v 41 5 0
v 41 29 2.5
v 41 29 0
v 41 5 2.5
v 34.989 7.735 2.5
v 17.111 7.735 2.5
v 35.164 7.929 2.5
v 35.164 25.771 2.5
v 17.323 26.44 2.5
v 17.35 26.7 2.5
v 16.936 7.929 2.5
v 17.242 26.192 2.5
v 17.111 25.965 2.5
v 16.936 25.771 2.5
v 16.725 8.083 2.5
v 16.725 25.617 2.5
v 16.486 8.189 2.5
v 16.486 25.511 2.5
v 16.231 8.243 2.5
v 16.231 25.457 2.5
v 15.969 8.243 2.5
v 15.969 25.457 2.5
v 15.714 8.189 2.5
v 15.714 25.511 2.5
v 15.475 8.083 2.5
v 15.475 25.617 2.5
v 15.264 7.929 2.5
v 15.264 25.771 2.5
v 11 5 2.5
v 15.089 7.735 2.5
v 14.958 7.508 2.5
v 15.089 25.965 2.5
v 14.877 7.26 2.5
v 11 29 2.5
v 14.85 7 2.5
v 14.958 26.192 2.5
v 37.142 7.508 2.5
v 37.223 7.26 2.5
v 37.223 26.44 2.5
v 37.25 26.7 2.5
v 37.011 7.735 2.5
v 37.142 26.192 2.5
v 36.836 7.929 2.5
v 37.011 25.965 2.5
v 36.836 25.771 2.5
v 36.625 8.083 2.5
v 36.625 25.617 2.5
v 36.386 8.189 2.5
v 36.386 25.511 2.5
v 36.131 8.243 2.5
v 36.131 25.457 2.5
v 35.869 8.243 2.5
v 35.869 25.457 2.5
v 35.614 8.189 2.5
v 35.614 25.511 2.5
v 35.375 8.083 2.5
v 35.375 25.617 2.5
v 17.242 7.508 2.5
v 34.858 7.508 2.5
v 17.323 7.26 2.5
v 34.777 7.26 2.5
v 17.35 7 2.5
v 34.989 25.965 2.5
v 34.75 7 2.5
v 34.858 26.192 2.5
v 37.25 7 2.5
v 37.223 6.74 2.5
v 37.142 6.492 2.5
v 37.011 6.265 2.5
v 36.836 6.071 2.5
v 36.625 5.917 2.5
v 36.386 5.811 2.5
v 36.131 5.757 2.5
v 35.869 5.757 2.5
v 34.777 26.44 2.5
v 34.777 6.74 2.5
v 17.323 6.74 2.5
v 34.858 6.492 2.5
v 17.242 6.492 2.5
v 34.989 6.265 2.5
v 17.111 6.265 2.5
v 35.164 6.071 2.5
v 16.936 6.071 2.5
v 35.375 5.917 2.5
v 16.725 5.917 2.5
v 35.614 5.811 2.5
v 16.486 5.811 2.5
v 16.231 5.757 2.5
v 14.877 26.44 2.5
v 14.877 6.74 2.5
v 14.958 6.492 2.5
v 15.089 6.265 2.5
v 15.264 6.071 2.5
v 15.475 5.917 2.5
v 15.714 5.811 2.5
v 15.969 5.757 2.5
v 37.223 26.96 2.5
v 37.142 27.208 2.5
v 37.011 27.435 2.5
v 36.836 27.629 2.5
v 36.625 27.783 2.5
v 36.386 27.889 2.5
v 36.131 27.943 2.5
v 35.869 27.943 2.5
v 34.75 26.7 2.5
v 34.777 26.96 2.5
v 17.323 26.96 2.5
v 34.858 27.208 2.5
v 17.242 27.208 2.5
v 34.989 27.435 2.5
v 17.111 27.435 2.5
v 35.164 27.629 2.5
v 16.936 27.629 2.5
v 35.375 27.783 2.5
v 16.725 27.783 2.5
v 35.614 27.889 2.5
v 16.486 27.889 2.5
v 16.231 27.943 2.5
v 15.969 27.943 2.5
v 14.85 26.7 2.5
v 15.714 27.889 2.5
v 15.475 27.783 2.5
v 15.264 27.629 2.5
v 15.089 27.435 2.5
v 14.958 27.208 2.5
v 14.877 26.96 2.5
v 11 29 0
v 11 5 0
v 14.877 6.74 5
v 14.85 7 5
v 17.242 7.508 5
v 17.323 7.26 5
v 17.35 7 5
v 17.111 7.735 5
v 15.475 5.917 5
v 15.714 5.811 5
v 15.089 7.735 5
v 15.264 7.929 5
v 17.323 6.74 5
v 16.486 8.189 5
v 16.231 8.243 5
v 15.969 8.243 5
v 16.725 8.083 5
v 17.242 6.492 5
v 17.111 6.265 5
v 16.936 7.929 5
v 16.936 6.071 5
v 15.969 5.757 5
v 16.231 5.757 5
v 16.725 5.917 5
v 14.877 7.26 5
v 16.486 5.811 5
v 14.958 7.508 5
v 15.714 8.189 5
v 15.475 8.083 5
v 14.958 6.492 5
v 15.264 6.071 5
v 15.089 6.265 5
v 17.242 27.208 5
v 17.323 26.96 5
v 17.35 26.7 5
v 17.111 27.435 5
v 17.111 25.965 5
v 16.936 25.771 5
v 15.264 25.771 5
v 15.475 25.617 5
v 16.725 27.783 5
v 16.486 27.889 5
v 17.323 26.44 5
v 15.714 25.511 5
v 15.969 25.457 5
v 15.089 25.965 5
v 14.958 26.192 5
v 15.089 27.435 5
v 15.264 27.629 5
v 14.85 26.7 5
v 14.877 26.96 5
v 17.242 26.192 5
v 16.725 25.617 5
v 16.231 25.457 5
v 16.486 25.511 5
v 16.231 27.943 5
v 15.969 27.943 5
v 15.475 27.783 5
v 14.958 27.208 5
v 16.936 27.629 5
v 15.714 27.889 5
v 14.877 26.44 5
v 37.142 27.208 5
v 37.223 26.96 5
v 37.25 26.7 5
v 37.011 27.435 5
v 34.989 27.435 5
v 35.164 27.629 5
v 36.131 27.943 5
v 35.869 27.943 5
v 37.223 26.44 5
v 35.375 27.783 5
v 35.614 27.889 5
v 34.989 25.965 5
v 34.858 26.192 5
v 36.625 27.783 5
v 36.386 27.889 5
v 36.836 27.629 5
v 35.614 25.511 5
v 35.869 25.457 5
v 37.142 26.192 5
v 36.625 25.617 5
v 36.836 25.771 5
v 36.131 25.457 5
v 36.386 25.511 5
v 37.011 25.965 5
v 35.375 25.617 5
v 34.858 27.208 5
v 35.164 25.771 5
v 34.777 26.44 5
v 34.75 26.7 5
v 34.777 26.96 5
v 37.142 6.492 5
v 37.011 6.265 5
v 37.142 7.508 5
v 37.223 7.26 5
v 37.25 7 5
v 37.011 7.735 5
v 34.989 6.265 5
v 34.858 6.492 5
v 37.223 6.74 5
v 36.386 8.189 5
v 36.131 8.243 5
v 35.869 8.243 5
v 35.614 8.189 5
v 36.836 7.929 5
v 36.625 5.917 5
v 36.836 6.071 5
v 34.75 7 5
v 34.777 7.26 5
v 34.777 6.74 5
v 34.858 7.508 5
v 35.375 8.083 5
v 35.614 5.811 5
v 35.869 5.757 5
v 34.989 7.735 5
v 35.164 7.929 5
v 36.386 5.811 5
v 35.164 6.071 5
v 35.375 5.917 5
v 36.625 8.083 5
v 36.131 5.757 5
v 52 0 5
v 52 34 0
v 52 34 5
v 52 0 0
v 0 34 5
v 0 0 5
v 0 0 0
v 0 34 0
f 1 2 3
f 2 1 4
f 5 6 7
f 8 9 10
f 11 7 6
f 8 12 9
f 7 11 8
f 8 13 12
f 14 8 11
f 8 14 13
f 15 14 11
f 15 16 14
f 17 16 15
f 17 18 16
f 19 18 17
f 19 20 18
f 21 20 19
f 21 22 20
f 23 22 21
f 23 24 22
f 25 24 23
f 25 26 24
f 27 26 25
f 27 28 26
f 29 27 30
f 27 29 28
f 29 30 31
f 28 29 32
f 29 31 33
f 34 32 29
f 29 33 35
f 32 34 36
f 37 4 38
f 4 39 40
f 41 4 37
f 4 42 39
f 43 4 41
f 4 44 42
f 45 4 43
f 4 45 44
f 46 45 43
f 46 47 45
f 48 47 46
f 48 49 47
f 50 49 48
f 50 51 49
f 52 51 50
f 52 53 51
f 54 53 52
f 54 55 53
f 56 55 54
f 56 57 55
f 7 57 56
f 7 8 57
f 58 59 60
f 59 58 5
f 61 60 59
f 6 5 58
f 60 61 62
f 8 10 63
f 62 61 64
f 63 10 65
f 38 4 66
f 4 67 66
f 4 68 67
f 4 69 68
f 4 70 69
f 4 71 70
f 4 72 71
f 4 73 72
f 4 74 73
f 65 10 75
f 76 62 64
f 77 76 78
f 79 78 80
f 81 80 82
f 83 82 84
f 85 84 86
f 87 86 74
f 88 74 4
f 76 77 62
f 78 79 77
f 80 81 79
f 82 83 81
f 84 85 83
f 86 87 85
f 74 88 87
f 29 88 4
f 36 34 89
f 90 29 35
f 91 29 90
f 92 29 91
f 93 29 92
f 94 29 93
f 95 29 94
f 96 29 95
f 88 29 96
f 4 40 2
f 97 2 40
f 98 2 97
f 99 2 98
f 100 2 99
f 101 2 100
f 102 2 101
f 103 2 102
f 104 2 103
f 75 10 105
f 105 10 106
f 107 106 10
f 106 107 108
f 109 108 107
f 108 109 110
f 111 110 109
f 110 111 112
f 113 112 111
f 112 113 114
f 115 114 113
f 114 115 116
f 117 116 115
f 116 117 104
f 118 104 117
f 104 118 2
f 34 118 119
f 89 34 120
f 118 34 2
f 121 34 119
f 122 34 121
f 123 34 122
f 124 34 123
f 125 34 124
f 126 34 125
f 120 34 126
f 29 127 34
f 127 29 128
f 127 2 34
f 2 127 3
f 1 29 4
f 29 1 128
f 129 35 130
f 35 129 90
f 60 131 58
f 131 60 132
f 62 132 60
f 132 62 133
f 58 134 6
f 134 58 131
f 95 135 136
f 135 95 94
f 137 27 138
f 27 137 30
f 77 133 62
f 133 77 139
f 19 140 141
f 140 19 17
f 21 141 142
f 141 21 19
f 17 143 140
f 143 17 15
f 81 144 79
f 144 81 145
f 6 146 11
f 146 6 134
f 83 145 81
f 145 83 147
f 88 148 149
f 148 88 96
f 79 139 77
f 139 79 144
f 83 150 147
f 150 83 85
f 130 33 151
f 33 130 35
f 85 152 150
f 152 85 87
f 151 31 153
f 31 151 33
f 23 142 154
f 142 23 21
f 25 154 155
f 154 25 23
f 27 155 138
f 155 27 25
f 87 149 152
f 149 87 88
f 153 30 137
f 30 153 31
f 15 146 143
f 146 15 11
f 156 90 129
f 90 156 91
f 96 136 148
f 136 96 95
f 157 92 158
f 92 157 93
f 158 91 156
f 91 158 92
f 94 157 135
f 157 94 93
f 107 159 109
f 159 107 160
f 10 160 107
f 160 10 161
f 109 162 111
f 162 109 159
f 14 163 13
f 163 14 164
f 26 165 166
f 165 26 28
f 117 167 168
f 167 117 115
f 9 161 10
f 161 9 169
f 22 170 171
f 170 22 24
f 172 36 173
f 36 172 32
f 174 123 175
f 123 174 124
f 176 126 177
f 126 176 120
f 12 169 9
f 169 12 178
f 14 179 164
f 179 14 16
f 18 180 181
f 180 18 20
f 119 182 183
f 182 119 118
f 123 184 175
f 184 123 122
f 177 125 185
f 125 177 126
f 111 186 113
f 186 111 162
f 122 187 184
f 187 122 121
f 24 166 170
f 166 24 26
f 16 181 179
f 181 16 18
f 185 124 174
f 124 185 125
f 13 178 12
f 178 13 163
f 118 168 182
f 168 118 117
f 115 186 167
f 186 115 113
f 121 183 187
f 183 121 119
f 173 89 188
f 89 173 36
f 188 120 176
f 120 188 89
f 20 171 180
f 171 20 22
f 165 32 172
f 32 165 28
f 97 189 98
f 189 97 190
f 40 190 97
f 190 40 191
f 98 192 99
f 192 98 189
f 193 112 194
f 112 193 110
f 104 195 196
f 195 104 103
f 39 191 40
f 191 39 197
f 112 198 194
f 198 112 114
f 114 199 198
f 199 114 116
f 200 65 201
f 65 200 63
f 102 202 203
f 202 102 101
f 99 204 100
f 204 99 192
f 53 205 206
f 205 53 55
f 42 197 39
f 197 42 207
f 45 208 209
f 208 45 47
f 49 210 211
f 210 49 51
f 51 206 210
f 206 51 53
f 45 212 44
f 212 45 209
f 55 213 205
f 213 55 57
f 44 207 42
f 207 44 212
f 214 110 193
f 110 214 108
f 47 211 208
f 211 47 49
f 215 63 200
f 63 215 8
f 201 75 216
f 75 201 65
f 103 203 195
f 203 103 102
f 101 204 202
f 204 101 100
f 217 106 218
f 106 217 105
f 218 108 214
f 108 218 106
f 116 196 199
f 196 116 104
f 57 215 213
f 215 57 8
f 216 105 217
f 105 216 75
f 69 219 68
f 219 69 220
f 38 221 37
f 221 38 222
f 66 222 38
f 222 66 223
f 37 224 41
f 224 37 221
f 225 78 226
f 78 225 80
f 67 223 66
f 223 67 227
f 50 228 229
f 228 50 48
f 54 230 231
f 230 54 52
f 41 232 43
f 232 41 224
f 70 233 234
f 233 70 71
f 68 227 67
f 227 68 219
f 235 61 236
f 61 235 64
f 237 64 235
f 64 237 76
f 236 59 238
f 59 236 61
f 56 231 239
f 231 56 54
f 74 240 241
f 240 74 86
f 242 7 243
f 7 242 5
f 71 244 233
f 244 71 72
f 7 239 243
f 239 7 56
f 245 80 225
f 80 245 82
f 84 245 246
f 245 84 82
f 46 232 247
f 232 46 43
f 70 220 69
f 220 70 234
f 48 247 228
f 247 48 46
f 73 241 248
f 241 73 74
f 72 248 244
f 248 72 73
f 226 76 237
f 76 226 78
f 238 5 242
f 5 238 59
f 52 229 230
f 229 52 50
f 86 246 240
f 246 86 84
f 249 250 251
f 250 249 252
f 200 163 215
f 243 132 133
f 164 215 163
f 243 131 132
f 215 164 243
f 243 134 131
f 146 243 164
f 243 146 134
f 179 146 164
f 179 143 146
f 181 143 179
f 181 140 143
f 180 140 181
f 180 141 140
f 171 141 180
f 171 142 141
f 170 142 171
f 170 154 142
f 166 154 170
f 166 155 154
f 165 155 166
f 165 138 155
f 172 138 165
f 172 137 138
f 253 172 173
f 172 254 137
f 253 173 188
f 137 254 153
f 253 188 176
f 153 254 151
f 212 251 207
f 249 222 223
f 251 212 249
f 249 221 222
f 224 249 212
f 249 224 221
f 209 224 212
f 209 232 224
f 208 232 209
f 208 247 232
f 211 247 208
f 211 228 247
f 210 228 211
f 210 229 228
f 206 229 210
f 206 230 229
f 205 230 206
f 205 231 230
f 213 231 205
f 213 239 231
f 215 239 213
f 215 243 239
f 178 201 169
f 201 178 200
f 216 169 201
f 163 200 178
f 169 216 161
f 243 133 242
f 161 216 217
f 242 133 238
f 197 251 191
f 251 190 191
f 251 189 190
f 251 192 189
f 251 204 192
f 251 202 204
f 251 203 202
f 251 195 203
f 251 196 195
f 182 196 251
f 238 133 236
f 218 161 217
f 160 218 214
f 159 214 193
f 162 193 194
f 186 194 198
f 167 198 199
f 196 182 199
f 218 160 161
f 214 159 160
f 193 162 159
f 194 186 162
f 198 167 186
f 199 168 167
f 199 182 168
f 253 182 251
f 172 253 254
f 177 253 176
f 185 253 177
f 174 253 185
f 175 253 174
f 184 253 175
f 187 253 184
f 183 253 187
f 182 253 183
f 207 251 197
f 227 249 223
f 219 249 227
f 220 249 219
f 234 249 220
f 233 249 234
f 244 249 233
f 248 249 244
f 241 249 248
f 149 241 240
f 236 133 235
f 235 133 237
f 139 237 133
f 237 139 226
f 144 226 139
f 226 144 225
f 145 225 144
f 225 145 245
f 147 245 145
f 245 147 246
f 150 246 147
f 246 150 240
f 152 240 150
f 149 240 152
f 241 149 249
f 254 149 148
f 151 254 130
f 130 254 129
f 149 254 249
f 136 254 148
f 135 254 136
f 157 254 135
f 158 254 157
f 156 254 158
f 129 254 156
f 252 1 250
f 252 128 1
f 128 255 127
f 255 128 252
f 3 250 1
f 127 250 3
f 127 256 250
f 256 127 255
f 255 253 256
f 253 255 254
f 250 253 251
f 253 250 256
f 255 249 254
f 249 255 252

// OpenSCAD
difference(){
cube([52, 34, 5]);

translate(v = [0, 4, 0]){
union(){
translate(v = [11, 1, -1]){
cube([30, 24, 3.5]);
}
translate(v = [16.1, 3, 0]) {
cylinder(r = 2.5/2, h = 10, $fn = 30);
}

translate(v = [16.1, 22.7, 0] ){
cylinder(r = 2.5/2, h = 10, $fn = 30);
}

translate(v = [36, 22.7, 0] ){
cylinder(r = 2.5/2, h = 10, $fn = 30);
}

translate(v = [36, 3, 0] ){
cylinder(r = 2.5/2, h = 10, $fn = 30);
}
}
}
}
